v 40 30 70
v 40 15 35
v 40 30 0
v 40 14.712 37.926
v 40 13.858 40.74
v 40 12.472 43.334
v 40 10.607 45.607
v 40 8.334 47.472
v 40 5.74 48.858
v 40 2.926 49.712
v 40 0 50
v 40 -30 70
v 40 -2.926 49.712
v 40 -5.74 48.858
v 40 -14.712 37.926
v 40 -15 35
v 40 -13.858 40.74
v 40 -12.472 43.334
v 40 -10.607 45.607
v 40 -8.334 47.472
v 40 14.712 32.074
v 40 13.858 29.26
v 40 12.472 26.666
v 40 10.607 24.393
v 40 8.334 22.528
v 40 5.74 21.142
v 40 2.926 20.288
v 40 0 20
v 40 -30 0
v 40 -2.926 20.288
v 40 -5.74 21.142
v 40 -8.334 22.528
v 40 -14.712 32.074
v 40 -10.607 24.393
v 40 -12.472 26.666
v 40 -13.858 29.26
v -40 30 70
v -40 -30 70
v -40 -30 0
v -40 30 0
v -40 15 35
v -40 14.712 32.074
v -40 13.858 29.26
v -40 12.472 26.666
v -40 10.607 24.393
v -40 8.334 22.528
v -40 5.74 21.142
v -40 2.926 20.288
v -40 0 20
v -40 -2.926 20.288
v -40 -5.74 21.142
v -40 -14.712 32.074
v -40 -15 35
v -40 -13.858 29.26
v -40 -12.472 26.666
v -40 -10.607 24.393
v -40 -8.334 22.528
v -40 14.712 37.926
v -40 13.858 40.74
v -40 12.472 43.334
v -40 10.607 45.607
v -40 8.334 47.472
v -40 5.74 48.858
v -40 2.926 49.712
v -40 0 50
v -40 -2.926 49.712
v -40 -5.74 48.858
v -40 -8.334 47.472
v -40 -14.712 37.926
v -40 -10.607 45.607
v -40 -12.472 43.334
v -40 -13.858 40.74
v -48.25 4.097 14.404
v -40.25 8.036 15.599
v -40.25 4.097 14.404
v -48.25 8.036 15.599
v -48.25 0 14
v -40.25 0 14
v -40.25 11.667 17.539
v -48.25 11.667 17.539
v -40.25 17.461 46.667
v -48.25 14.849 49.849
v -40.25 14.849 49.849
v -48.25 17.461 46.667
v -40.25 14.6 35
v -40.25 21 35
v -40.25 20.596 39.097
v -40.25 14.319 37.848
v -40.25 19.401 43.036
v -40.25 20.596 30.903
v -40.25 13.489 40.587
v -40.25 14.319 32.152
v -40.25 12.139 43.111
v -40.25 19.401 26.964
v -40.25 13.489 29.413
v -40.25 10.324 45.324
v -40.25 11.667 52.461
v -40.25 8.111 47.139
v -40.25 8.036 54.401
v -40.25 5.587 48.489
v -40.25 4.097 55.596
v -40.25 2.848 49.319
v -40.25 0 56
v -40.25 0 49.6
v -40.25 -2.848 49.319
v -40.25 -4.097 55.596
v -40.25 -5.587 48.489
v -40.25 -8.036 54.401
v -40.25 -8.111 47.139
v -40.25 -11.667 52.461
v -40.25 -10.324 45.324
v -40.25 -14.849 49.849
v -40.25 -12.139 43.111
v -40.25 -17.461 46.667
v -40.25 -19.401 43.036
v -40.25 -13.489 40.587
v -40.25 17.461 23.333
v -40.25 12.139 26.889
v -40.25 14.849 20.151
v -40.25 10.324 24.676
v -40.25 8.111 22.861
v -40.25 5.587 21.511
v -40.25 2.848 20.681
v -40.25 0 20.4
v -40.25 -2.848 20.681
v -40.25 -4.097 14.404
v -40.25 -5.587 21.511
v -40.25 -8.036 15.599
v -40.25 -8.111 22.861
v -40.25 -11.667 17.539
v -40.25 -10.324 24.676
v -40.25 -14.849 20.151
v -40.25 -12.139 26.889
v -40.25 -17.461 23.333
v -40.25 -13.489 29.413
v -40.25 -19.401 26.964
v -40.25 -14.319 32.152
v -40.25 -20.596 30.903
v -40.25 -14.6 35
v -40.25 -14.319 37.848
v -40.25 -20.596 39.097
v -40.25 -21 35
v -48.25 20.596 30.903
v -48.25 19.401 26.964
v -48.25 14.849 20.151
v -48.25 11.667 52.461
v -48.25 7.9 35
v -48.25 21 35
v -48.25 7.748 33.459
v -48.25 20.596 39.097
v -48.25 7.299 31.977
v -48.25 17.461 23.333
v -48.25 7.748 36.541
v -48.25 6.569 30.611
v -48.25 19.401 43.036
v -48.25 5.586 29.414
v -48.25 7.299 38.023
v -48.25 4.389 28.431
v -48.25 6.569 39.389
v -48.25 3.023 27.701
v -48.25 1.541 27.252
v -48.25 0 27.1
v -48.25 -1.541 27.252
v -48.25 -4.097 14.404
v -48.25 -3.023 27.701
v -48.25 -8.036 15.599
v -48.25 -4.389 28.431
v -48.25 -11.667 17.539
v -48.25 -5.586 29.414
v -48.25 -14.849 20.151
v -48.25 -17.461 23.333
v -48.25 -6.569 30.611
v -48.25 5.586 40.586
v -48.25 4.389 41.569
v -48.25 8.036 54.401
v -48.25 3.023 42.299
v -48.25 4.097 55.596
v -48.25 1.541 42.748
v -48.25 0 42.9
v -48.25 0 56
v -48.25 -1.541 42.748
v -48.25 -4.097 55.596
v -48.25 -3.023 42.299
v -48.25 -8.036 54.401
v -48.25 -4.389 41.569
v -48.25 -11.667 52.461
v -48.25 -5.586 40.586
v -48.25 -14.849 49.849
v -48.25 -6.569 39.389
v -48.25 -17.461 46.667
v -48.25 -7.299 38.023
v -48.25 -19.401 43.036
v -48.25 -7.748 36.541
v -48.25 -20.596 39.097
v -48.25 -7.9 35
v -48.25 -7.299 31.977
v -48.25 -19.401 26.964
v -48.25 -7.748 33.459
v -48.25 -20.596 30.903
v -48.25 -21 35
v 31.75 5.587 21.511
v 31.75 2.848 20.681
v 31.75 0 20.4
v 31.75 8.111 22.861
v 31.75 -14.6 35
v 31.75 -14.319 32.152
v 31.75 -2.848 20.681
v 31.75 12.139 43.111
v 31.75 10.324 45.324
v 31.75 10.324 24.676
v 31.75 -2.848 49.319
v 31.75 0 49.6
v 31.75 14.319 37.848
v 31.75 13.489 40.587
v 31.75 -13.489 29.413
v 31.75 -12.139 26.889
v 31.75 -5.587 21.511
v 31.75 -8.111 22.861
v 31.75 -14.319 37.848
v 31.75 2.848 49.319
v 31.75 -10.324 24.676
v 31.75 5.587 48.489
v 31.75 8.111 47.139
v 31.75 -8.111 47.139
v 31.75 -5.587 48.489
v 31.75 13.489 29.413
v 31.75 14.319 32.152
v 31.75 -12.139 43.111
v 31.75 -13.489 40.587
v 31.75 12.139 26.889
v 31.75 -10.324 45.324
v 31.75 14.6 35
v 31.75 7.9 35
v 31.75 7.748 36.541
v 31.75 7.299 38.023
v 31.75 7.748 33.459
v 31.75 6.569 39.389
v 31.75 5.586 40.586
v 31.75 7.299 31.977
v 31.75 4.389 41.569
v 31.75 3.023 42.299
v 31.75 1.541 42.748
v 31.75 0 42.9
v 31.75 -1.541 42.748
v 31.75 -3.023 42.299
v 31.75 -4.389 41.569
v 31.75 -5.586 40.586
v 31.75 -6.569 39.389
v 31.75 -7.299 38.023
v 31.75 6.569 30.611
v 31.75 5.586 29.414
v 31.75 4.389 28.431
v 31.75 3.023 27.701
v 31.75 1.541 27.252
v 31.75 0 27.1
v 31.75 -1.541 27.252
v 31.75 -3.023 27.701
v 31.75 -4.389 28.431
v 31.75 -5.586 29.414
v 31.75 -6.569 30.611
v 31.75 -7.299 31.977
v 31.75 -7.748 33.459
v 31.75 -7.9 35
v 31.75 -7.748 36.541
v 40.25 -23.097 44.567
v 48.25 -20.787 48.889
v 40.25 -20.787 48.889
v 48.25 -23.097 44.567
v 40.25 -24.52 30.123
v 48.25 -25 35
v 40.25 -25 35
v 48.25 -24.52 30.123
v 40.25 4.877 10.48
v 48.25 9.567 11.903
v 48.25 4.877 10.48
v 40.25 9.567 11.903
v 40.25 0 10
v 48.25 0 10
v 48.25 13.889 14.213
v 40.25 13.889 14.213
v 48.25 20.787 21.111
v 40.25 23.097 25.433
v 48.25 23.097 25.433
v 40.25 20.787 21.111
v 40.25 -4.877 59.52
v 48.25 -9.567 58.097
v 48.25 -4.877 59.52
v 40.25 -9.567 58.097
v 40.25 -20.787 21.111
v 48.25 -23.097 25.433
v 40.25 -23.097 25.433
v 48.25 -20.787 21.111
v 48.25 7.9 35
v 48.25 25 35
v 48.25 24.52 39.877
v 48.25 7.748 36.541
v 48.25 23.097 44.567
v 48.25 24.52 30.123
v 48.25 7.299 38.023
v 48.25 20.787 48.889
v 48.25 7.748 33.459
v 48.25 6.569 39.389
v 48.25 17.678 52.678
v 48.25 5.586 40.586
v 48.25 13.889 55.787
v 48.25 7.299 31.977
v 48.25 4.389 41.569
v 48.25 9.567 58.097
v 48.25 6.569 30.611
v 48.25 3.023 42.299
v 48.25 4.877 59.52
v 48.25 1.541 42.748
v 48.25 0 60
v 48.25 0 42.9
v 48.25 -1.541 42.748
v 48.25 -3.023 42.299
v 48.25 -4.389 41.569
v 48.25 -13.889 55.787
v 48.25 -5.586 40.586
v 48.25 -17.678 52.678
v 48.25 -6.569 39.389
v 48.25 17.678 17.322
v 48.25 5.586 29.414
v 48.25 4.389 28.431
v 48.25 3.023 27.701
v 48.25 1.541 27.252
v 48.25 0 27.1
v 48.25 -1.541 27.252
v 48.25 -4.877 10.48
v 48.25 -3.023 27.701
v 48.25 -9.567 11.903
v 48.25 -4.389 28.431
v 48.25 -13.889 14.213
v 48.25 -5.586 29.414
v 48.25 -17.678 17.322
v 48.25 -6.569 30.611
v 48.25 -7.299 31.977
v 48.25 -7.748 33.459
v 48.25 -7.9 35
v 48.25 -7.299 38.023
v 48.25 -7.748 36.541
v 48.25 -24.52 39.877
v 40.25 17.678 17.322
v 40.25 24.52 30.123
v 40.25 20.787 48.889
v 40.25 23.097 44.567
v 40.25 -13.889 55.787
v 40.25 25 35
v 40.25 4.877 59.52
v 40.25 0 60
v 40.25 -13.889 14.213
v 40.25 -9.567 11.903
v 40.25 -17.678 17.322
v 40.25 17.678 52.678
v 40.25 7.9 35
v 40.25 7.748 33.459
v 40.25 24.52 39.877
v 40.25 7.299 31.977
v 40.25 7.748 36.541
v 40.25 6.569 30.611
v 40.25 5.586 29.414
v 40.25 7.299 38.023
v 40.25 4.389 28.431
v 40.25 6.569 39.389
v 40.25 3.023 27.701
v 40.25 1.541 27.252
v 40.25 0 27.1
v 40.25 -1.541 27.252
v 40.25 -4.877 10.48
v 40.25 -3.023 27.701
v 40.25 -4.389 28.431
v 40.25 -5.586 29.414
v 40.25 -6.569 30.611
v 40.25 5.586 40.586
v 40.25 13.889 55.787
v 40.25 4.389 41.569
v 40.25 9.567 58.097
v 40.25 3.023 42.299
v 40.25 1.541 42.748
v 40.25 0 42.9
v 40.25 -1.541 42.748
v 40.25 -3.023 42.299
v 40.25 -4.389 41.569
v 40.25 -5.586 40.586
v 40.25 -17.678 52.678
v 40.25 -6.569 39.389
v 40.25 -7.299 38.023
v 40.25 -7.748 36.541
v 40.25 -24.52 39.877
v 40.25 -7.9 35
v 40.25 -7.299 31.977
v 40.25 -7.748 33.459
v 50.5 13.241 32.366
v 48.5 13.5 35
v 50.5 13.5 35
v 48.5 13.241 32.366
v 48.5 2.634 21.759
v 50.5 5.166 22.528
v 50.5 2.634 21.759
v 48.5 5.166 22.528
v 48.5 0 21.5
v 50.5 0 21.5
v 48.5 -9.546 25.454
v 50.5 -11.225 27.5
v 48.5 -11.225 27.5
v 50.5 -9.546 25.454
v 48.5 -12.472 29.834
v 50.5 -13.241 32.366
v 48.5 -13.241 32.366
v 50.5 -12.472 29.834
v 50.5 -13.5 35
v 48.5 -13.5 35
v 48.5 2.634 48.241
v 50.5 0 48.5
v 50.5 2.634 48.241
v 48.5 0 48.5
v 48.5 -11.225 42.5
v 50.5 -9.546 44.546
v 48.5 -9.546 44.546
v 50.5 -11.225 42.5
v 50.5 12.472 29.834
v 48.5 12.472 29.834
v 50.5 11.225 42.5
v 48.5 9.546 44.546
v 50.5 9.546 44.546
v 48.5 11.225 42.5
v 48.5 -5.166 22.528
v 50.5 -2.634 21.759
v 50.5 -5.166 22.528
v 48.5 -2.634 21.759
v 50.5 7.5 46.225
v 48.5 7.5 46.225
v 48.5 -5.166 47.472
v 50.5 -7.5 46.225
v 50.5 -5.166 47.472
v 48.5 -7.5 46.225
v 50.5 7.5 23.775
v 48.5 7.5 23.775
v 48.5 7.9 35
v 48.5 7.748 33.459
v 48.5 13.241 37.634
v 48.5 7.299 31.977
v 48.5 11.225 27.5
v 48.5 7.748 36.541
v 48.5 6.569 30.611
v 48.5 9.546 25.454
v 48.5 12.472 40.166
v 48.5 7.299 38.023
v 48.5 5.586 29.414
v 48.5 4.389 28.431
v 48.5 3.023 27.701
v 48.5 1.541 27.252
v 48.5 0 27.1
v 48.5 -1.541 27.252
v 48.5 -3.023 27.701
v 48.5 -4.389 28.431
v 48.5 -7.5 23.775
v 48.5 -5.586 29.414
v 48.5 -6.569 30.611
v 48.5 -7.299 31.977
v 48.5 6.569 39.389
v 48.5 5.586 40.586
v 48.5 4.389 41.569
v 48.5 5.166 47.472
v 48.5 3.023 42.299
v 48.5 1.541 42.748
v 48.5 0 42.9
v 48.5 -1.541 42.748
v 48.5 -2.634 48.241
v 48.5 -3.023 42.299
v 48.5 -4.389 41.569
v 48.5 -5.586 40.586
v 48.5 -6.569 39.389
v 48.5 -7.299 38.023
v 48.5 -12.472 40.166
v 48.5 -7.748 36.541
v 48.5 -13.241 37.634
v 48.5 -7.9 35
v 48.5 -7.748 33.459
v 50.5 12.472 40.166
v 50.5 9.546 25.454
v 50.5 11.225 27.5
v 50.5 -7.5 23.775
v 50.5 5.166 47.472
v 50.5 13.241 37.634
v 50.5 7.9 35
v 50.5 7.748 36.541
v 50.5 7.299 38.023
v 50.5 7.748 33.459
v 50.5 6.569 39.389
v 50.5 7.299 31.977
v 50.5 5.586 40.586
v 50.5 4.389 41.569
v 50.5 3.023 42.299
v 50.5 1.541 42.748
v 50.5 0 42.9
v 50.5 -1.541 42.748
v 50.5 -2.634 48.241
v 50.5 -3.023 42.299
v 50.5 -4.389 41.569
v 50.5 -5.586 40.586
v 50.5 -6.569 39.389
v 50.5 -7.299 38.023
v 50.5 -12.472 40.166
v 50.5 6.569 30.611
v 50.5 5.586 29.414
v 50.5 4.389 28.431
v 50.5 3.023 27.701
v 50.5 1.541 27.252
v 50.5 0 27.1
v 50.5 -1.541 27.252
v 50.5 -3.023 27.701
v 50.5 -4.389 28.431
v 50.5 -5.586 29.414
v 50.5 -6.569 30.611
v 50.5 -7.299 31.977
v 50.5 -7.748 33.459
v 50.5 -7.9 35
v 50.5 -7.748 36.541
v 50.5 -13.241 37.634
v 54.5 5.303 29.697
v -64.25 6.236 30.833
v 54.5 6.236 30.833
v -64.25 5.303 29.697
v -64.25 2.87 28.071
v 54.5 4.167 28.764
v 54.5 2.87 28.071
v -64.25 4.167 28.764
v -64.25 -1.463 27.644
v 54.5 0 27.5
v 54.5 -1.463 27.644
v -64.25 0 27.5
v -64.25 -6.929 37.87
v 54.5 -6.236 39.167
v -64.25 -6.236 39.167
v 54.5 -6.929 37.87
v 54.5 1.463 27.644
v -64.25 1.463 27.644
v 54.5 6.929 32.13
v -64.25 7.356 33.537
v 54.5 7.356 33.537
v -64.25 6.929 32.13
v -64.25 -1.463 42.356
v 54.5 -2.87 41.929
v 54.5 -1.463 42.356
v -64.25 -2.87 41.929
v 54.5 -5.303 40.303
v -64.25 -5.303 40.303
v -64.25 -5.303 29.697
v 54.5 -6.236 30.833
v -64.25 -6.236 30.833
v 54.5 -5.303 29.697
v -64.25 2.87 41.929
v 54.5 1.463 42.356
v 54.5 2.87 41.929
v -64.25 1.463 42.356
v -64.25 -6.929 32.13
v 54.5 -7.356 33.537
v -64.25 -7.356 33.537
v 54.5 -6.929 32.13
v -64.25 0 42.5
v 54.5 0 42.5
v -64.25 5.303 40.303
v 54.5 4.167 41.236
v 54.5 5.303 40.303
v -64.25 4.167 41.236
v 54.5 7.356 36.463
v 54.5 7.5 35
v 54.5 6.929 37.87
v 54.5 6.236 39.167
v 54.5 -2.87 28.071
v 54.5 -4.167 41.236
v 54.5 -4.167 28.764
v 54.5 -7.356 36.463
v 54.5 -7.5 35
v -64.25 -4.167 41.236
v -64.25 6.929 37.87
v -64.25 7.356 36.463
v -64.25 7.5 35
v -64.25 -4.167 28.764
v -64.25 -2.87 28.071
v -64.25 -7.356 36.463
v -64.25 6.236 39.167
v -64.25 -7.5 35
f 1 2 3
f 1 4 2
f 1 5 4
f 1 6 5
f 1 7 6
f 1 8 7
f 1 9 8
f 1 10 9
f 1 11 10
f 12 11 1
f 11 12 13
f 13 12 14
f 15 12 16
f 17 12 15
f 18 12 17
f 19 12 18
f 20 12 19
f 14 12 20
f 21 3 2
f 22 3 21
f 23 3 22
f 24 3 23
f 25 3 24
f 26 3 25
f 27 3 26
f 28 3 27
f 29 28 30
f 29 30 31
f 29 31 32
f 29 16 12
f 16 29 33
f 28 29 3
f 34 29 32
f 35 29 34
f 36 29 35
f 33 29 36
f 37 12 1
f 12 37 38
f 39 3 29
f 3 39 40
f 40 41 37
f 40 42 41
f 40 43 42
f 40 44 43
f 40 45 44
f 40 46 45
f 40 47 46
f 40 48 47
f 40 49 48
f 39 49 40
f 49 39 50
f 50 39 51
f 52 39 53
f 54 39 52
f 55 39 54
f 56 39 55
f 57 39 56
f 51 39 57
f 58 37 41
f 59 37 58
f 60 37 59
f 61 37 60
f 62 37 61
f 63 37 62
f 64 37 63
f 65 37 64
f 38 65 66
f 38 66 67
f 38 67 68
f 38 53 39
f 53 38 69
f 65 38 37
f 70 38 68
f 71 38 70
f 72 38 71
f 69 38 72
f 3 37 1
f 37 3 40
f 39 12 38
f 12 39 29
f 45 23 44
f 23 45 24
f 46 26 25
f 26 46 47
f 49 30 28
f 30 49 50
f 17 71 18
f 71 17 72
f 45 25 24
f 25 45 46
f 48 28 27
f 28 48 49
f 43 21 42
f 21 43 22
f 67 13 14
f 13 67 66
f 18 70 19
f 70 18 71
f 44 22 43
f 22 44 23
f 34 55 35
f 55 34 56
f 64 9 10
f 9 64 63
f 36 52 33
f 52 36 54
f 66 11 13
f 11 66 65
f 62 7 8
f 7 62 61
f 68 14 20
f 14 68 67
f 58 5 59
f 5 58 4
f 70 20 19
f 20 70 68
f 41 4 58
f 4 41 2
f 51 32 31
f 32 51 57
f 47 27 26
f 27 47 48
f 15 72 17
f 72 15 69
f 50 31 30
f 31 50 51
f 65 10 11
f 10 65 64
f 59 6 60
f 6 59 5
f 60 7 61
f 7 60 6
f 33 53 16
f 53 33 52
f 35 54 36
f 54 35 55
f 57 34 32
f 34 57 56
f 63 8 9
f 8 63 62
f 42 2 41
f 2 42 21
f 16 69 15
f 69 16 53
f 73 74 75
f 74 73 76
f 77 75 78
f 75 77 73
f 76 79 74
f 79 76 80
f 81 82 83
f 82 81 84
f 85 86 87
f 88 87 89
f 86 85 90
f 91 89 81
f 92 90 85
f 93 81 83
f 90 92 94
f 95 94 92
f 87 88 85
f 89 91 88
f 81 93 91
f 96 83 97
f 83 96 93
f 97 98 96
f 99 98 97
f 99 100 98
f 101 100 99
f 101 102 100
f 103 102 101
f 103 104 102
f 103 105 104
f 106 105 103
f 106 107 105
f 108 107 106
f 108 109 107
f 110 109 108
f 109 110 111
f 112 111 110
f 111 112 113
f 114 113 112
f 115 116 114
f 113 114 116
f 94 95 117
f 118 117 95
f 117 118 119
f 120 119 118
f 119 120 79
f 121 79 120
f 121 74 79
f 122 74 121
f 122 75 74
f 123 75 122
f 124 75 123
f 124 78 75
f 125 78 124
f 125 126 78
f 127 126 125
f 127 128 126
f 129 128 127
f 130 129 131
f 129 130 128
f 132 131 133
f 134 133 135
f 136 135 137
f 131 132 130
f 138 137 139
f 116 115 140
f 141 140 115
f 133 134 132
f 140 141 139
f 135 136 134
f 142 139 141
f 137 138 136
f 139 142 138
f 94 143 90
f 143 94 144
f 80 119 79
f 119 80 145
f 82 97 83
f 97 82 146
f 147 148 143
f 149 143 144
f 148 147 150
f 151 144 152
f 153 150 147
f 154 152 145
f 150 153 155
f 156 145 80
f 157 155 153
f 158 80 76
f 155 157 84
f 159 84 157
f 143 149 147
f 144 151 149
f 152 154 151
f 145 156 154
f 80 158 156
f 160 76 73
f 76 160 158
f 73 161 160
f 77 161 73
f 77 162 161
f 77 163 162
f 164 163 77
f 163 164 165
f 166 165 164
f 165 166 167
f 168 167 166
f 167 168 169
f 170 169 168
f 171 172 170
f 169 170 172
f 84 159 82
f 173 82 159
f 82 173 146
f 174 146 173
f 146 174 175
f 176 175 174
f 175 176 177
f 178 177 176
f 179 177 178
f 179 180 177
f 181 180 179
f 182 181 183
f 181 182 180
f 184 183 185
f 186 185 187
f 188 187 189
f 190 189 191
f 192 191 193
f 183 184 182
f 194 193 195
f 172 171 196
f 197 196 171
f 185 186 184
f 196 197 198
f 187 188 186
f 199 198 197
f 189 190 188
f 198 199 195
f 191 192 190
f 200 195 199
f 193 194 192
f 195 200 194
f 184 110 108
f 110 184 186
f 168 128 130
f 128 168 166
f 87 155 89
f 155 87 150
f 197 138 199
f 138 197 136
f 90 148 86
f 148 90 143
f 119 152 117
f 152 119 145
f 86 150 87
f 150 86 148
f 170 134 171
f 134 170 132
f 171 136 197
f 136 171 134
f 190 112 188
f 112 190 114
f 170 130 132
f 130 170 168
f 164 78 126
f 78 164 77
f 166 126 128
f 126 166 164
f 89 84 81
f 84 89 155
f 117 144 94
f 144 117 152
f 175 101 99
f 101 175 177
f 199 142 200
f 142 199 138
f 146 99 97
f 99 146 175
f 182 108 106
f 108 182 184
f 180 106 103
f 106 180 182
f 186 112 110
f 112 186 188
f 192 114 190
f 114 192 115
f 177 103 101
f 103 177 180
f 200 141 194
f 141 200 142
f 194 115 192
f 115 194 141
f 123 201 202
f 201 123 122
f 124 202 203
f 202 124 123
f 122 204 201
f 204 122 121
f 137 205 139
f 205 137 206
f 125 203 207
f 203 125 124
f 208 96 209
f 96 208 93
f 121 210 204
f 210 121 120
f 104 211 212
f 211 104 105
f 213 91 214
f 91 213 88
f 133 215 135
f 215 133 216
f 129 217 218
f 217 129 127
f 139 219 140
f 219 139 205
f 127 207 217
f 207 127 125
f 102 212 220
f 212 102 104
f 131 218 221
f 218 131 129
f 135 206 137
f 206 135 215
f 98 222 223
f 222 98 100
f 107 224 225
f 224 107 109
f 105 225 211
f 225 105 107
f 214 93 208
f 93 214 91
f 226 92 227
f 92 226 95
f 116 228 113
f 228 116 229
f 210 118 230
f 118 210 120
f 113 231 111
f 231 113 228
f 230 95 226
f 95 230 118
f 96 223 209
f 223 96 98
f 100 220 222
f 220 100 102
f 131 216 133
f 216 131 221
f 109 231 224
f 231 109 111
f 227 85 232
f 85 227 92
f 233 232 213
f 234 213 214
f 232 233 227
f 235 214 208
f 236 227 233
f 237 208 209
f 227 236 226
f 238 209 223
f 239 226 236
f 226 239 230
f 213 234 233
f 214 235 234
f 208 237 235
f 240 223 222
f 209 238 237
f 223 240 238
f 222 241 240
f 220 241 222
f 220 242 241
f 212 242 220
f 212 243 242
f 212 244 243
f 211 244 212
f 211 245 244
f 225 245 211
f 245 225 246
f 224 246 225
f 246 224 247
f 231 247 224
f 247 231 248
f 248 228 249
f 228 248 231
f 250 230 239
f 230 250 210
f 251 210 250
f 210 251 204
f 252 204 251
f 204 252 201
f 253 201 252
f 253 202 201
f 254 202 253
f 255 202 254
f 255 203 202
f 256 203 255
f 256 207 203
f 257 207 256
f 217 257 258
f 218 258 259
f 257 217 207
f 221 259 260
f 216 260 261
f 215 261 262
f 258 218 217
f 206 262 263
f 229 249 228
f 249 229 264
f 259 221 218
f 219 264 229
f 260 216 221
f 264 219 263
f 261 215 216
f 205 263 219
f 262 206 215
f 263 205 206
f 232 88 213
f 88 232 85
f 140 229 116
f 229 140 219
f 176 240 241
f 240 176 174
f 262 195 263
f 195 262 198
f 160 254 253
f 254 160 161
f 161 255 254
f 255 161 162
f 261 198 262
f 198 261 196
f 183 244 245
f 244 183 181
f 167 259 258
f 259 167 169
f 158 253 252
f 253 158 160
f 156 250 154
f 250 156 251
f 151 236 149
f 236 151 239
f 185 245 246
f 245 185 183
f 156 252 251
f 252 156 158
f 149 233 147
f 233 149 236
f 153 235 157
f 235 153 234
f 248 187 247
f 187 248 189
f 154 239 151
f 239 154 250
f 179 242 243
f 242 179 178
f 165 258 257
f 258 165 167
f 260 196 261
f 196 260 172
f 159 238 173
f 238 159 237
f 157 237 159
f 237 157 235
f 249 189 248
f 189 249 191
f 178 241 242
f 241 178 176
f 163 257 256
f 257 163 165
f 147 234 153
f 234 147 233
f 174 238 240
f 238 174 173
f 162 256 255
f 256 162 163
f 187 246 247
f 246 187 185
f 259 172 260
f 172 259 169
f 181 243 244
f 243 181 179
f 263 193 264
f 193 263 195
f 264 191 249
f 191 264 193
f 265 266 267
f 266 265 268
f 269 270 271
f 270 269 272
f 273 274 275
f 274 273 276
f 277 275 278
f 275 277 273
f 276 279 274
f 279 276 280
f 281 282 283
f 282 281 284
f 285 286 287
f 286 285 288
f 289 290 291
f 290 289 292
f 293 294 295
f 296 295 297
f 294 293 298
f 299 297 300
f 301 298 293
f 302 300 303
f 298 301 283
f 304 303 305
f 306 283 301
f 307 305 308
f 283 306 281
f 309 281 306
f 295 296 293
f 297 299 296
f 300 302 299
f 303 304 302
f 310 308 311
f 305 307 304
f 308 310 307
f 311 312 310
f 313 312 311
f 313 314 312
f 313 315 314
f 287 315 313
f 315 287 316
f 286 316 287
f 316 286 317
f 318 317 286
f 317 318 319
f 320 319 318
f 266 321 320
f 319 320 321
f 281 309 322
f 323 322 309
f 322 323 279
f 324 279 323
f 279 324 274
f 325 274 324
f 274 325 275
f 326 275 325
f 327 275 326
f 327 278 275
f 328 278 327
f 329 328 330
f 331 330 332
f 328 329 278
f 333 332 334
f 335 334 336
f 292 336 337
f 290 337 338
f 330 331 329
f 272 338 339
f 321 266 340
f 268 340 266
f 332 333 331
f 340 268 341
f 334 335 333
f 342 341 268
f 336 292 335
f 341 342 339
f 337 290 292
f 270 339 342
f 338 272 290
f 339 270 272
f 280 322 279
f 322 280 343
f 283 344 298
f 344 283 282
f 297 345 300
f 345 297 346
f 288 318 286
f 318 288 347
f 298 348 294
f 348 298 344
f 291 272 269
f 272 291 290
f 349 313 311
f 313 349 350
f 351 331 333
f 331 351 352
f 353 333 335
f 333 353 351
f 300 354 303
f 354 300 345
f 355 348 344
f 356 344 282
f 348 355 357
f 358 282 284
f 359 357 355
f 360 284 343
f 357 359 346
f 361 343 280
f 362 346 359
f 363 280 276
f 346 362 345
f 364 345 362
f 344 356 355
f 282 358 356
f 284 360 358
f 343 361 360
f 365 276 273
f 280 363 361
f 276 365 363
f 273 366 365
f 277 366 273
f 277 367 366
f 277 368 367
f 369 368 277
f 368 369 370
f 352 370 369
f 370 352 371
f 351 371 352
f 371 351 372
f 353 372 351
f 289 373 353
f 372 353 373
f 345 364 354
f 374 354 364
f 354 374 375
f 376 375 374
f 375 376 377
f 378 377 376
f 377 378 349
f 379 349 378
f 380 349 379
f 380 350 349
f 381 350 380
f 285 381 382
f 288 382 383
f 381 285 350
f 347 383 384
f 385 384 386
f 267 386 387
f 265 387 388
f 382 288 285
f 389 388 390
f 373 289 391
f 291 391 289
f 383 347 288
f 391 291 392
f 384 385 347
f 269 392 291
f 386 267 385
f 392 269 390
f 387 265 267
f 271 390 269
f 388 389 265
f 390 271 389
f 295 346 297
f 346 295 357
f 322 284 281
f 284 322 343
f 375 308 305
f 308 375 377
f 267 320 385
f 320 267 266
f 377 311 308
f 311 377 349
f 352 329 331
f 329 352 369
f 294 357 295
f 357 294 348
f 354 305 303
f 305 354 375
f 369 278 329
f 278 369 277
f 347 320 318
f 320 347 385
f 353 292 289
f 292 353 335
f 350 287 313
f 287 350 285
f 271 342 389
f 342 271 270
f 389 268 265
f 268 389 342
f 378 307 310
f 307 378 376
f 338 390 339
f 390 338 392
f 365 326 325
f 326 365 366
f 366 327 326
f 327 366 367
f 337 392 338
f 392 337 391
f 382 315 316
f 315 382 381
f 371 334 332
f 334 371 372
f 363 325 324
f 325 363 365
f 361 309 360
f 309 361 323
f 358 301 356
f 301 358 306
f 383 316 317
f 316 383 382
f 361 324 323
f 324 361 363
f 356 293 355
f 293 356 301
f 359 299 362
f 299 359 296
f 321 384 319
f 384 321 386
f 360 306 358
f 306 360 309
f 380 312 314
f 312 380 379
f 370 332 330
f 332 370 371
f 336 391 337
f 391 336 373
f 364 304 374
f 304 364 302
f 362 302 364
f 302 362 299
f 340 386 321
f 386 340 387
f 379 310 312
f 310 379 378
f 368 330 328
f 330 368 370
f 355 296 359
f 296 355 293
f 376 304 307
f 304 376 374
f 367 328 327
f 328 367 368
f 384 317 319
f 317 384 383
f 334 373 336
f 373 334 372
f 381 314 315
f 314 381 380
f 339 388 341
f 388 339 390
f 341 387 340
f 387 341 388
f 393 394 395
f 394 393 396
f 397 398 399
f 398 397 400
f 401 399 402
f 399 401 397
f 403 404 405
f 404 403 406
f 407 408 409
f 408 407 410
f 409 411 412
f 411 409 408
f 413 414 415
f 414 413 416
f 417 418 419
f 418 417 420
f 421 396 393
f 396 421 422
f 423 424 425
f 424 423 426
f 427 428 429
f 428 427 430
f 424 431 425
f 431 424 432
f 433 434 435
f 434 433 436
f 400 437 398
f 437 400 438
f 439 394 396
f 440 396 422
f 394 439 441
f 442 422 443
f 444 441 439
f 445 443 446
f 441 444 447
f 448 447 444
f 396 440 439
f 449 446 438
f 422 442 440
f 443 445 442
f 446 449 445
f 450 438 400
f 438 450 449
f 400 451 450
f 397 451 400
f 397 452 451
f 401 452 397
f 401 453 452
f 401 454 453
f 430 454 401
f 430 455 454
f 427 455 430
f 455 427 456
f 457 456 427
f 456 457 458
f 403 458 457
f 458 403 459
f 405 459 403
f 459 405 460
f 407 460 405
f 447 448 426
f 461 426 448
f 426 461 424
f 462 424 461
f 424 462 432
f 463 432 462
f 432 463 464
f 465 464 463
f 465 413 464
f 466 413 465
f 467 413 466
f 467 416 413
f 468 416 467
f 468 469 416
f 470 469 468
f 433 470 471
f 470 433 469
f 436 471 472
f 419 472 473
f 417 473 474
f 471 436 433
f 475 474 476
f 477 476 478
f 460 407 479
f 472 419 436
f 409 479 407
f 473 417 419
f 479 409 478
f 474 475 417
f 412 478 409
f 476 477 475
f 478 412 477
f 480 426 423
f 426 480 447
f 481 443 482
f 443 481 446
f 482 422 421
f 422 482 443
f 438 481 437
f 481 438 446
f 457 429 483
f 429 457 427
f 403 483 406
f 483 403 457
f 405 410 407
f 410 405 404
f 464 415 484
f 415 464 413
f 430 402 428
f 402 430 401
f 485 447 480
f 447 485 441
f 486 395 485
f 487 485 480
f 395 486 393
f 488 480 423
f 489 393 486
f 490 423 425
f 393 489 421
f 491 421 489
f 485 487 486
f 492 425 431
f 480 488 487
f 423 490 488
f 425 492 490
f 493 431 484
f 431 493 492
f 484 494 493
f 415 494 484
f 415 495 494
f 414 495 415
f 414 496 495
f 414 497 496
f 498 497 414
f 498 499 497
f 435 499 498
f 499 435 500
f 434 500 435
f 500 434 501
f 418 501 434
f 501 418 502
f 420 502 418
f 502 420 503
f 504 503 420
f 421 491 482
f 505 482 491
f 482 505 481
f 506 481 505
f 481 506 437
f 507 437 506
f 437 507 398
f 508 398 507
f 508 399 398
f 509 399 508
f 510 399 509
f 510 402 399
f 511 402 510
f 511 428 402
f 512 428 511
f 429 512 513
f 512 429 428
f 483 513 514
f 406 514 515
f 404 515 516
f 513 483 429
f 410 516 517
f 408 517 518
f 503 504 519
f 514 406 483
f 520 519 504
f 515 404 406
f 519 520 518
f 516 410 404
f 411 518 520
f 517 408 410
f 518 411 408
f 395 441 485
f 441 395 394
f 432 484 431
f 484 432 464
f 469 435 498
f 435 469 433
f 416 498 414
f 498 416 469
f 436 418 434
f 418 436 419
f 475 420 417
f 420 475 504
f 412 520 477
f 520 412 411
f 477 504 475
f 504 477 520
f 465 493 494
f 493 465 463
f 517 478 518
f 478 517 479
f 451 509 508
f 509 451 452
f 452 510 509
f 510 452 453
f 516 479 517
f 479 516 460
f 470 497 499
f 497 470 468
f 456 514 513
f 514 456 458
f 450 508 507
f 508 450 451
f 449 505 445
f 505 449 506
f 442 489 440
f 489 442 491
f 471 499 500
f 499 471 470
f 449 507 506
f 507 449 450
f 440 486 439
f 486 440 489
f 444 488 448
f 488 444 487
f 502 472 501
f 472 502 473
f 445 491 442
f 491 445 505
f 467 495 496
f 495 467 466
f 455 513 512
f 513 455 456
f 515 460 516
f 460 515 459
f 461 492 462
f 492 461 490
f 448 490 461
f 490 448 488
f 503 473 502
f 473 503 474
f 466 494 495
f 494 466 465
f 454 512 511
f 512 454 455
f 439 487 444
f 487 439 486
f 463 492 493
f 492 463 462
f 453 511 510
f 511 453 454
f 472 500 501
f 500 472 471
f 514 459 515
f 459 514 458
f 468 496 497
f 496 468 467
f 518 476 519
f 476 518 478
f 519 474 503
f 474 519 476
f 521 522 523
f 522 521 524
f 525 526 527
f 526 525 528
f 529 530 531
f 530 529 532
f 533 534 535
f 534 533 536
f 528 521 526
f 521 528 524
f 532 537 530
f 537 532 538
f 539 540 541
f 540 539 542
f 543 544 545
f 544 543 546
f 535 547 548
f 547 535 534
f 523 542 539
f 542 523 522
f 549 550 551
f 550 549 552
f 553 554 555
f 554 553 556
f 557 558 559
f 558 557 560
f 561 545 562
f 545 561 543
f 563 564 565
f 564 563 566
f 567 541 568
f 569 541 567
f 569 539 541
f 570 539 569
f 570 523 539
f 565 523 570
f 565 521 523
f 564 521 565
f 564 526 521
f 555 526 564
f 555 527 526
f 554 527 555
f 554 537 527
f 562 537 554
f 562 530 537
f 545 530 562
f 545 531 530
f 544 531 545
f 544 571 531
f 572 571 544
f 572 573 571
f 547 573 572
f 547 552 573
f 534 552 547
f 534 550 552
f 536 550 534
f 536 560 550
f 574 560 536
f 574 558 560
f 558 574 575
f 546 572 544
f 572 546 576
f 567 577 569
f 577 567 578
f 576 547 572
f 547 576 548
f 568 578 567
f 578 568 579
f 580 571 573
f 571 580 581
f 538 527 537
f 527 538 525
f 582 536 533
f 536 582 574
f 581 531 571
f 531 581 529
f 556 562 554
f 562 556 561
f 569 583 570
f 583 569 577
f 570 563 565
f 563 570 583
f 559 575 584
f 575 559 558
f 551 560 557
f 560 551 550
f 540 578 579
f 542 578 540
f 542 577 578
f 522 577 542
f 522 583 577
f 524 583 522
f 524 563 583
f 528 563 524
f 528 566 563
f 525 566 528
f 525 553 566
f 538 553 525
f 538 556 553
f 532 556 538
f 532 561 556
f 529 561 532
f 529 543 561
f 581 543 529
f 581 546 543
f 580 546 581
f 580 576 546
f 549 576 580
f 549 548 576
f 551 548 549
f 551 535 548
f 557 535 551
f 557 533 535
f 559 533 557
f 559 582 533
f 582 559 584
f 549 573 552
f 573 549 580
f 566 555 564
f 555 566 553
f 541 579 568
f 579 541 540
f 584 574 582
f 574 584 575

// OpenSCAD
$fn = 32;

// ------------------------------------------------------------------------
// Bushed housing: 80 x 60 x 70 mm housing, bushing d29.2
// Every part is its own module, assembly() places them once.
// ------------------------------------------------------------------------

// --- part 1 ---
module housing() {
  difference() {
    translate([-40, -30, 0]) cube([80, 60, 70]);
    translate([0, 0, 35]) rotate([0, 90, 0]) cylinder(h = 82, d = 30, center = true);
  }
}

// --- part 2 ---
module bushing() {
  difference() {
    union() {
      cylinder(h = 8, d = 42);
      translate([0, 0, 8]) cylinder(h = 72, d = 29.2);
    }
    translate([0, 0, -1]) cylinder(h = 82, d = 15.8);
  }
}

// --- part 3 ---
module shaft() {
  translate([0, 0, -59.375]) cylinder(h = 118.75, d = 15);
}

// --- part 4 ---
module cover() {
  difference() {
    cylinder(h = 8, d = 50);
    translate([0, 0, -1]) cylinder(h = 10, d = 15.8);
  }
}

// --- part 5 ---
module washer() {
  difference() {
      translate([0, 0, 0]) cylinder(h = 2, d = 27);
      translate([0, 0, -1]) cylinder(h = 4, d = 15.8);
    }
}

// --- assembly ---
module assembly() {
  translate([0, 0, 0]) rotate([0, 0, 0]) housing();
  translate([-48.25, 0, 35]) rotate([0, 90, 0]) bushing();
  translate([-4.875, 0, 35]) rotate([0, 90, 0]) shaft();
  translate([40.25, 0, 35]) rotate([0, 90, 0]) cover();
  translate([48.5, 0, 35]) rotate([0, 90, 0]) washer();
}

assembly();
